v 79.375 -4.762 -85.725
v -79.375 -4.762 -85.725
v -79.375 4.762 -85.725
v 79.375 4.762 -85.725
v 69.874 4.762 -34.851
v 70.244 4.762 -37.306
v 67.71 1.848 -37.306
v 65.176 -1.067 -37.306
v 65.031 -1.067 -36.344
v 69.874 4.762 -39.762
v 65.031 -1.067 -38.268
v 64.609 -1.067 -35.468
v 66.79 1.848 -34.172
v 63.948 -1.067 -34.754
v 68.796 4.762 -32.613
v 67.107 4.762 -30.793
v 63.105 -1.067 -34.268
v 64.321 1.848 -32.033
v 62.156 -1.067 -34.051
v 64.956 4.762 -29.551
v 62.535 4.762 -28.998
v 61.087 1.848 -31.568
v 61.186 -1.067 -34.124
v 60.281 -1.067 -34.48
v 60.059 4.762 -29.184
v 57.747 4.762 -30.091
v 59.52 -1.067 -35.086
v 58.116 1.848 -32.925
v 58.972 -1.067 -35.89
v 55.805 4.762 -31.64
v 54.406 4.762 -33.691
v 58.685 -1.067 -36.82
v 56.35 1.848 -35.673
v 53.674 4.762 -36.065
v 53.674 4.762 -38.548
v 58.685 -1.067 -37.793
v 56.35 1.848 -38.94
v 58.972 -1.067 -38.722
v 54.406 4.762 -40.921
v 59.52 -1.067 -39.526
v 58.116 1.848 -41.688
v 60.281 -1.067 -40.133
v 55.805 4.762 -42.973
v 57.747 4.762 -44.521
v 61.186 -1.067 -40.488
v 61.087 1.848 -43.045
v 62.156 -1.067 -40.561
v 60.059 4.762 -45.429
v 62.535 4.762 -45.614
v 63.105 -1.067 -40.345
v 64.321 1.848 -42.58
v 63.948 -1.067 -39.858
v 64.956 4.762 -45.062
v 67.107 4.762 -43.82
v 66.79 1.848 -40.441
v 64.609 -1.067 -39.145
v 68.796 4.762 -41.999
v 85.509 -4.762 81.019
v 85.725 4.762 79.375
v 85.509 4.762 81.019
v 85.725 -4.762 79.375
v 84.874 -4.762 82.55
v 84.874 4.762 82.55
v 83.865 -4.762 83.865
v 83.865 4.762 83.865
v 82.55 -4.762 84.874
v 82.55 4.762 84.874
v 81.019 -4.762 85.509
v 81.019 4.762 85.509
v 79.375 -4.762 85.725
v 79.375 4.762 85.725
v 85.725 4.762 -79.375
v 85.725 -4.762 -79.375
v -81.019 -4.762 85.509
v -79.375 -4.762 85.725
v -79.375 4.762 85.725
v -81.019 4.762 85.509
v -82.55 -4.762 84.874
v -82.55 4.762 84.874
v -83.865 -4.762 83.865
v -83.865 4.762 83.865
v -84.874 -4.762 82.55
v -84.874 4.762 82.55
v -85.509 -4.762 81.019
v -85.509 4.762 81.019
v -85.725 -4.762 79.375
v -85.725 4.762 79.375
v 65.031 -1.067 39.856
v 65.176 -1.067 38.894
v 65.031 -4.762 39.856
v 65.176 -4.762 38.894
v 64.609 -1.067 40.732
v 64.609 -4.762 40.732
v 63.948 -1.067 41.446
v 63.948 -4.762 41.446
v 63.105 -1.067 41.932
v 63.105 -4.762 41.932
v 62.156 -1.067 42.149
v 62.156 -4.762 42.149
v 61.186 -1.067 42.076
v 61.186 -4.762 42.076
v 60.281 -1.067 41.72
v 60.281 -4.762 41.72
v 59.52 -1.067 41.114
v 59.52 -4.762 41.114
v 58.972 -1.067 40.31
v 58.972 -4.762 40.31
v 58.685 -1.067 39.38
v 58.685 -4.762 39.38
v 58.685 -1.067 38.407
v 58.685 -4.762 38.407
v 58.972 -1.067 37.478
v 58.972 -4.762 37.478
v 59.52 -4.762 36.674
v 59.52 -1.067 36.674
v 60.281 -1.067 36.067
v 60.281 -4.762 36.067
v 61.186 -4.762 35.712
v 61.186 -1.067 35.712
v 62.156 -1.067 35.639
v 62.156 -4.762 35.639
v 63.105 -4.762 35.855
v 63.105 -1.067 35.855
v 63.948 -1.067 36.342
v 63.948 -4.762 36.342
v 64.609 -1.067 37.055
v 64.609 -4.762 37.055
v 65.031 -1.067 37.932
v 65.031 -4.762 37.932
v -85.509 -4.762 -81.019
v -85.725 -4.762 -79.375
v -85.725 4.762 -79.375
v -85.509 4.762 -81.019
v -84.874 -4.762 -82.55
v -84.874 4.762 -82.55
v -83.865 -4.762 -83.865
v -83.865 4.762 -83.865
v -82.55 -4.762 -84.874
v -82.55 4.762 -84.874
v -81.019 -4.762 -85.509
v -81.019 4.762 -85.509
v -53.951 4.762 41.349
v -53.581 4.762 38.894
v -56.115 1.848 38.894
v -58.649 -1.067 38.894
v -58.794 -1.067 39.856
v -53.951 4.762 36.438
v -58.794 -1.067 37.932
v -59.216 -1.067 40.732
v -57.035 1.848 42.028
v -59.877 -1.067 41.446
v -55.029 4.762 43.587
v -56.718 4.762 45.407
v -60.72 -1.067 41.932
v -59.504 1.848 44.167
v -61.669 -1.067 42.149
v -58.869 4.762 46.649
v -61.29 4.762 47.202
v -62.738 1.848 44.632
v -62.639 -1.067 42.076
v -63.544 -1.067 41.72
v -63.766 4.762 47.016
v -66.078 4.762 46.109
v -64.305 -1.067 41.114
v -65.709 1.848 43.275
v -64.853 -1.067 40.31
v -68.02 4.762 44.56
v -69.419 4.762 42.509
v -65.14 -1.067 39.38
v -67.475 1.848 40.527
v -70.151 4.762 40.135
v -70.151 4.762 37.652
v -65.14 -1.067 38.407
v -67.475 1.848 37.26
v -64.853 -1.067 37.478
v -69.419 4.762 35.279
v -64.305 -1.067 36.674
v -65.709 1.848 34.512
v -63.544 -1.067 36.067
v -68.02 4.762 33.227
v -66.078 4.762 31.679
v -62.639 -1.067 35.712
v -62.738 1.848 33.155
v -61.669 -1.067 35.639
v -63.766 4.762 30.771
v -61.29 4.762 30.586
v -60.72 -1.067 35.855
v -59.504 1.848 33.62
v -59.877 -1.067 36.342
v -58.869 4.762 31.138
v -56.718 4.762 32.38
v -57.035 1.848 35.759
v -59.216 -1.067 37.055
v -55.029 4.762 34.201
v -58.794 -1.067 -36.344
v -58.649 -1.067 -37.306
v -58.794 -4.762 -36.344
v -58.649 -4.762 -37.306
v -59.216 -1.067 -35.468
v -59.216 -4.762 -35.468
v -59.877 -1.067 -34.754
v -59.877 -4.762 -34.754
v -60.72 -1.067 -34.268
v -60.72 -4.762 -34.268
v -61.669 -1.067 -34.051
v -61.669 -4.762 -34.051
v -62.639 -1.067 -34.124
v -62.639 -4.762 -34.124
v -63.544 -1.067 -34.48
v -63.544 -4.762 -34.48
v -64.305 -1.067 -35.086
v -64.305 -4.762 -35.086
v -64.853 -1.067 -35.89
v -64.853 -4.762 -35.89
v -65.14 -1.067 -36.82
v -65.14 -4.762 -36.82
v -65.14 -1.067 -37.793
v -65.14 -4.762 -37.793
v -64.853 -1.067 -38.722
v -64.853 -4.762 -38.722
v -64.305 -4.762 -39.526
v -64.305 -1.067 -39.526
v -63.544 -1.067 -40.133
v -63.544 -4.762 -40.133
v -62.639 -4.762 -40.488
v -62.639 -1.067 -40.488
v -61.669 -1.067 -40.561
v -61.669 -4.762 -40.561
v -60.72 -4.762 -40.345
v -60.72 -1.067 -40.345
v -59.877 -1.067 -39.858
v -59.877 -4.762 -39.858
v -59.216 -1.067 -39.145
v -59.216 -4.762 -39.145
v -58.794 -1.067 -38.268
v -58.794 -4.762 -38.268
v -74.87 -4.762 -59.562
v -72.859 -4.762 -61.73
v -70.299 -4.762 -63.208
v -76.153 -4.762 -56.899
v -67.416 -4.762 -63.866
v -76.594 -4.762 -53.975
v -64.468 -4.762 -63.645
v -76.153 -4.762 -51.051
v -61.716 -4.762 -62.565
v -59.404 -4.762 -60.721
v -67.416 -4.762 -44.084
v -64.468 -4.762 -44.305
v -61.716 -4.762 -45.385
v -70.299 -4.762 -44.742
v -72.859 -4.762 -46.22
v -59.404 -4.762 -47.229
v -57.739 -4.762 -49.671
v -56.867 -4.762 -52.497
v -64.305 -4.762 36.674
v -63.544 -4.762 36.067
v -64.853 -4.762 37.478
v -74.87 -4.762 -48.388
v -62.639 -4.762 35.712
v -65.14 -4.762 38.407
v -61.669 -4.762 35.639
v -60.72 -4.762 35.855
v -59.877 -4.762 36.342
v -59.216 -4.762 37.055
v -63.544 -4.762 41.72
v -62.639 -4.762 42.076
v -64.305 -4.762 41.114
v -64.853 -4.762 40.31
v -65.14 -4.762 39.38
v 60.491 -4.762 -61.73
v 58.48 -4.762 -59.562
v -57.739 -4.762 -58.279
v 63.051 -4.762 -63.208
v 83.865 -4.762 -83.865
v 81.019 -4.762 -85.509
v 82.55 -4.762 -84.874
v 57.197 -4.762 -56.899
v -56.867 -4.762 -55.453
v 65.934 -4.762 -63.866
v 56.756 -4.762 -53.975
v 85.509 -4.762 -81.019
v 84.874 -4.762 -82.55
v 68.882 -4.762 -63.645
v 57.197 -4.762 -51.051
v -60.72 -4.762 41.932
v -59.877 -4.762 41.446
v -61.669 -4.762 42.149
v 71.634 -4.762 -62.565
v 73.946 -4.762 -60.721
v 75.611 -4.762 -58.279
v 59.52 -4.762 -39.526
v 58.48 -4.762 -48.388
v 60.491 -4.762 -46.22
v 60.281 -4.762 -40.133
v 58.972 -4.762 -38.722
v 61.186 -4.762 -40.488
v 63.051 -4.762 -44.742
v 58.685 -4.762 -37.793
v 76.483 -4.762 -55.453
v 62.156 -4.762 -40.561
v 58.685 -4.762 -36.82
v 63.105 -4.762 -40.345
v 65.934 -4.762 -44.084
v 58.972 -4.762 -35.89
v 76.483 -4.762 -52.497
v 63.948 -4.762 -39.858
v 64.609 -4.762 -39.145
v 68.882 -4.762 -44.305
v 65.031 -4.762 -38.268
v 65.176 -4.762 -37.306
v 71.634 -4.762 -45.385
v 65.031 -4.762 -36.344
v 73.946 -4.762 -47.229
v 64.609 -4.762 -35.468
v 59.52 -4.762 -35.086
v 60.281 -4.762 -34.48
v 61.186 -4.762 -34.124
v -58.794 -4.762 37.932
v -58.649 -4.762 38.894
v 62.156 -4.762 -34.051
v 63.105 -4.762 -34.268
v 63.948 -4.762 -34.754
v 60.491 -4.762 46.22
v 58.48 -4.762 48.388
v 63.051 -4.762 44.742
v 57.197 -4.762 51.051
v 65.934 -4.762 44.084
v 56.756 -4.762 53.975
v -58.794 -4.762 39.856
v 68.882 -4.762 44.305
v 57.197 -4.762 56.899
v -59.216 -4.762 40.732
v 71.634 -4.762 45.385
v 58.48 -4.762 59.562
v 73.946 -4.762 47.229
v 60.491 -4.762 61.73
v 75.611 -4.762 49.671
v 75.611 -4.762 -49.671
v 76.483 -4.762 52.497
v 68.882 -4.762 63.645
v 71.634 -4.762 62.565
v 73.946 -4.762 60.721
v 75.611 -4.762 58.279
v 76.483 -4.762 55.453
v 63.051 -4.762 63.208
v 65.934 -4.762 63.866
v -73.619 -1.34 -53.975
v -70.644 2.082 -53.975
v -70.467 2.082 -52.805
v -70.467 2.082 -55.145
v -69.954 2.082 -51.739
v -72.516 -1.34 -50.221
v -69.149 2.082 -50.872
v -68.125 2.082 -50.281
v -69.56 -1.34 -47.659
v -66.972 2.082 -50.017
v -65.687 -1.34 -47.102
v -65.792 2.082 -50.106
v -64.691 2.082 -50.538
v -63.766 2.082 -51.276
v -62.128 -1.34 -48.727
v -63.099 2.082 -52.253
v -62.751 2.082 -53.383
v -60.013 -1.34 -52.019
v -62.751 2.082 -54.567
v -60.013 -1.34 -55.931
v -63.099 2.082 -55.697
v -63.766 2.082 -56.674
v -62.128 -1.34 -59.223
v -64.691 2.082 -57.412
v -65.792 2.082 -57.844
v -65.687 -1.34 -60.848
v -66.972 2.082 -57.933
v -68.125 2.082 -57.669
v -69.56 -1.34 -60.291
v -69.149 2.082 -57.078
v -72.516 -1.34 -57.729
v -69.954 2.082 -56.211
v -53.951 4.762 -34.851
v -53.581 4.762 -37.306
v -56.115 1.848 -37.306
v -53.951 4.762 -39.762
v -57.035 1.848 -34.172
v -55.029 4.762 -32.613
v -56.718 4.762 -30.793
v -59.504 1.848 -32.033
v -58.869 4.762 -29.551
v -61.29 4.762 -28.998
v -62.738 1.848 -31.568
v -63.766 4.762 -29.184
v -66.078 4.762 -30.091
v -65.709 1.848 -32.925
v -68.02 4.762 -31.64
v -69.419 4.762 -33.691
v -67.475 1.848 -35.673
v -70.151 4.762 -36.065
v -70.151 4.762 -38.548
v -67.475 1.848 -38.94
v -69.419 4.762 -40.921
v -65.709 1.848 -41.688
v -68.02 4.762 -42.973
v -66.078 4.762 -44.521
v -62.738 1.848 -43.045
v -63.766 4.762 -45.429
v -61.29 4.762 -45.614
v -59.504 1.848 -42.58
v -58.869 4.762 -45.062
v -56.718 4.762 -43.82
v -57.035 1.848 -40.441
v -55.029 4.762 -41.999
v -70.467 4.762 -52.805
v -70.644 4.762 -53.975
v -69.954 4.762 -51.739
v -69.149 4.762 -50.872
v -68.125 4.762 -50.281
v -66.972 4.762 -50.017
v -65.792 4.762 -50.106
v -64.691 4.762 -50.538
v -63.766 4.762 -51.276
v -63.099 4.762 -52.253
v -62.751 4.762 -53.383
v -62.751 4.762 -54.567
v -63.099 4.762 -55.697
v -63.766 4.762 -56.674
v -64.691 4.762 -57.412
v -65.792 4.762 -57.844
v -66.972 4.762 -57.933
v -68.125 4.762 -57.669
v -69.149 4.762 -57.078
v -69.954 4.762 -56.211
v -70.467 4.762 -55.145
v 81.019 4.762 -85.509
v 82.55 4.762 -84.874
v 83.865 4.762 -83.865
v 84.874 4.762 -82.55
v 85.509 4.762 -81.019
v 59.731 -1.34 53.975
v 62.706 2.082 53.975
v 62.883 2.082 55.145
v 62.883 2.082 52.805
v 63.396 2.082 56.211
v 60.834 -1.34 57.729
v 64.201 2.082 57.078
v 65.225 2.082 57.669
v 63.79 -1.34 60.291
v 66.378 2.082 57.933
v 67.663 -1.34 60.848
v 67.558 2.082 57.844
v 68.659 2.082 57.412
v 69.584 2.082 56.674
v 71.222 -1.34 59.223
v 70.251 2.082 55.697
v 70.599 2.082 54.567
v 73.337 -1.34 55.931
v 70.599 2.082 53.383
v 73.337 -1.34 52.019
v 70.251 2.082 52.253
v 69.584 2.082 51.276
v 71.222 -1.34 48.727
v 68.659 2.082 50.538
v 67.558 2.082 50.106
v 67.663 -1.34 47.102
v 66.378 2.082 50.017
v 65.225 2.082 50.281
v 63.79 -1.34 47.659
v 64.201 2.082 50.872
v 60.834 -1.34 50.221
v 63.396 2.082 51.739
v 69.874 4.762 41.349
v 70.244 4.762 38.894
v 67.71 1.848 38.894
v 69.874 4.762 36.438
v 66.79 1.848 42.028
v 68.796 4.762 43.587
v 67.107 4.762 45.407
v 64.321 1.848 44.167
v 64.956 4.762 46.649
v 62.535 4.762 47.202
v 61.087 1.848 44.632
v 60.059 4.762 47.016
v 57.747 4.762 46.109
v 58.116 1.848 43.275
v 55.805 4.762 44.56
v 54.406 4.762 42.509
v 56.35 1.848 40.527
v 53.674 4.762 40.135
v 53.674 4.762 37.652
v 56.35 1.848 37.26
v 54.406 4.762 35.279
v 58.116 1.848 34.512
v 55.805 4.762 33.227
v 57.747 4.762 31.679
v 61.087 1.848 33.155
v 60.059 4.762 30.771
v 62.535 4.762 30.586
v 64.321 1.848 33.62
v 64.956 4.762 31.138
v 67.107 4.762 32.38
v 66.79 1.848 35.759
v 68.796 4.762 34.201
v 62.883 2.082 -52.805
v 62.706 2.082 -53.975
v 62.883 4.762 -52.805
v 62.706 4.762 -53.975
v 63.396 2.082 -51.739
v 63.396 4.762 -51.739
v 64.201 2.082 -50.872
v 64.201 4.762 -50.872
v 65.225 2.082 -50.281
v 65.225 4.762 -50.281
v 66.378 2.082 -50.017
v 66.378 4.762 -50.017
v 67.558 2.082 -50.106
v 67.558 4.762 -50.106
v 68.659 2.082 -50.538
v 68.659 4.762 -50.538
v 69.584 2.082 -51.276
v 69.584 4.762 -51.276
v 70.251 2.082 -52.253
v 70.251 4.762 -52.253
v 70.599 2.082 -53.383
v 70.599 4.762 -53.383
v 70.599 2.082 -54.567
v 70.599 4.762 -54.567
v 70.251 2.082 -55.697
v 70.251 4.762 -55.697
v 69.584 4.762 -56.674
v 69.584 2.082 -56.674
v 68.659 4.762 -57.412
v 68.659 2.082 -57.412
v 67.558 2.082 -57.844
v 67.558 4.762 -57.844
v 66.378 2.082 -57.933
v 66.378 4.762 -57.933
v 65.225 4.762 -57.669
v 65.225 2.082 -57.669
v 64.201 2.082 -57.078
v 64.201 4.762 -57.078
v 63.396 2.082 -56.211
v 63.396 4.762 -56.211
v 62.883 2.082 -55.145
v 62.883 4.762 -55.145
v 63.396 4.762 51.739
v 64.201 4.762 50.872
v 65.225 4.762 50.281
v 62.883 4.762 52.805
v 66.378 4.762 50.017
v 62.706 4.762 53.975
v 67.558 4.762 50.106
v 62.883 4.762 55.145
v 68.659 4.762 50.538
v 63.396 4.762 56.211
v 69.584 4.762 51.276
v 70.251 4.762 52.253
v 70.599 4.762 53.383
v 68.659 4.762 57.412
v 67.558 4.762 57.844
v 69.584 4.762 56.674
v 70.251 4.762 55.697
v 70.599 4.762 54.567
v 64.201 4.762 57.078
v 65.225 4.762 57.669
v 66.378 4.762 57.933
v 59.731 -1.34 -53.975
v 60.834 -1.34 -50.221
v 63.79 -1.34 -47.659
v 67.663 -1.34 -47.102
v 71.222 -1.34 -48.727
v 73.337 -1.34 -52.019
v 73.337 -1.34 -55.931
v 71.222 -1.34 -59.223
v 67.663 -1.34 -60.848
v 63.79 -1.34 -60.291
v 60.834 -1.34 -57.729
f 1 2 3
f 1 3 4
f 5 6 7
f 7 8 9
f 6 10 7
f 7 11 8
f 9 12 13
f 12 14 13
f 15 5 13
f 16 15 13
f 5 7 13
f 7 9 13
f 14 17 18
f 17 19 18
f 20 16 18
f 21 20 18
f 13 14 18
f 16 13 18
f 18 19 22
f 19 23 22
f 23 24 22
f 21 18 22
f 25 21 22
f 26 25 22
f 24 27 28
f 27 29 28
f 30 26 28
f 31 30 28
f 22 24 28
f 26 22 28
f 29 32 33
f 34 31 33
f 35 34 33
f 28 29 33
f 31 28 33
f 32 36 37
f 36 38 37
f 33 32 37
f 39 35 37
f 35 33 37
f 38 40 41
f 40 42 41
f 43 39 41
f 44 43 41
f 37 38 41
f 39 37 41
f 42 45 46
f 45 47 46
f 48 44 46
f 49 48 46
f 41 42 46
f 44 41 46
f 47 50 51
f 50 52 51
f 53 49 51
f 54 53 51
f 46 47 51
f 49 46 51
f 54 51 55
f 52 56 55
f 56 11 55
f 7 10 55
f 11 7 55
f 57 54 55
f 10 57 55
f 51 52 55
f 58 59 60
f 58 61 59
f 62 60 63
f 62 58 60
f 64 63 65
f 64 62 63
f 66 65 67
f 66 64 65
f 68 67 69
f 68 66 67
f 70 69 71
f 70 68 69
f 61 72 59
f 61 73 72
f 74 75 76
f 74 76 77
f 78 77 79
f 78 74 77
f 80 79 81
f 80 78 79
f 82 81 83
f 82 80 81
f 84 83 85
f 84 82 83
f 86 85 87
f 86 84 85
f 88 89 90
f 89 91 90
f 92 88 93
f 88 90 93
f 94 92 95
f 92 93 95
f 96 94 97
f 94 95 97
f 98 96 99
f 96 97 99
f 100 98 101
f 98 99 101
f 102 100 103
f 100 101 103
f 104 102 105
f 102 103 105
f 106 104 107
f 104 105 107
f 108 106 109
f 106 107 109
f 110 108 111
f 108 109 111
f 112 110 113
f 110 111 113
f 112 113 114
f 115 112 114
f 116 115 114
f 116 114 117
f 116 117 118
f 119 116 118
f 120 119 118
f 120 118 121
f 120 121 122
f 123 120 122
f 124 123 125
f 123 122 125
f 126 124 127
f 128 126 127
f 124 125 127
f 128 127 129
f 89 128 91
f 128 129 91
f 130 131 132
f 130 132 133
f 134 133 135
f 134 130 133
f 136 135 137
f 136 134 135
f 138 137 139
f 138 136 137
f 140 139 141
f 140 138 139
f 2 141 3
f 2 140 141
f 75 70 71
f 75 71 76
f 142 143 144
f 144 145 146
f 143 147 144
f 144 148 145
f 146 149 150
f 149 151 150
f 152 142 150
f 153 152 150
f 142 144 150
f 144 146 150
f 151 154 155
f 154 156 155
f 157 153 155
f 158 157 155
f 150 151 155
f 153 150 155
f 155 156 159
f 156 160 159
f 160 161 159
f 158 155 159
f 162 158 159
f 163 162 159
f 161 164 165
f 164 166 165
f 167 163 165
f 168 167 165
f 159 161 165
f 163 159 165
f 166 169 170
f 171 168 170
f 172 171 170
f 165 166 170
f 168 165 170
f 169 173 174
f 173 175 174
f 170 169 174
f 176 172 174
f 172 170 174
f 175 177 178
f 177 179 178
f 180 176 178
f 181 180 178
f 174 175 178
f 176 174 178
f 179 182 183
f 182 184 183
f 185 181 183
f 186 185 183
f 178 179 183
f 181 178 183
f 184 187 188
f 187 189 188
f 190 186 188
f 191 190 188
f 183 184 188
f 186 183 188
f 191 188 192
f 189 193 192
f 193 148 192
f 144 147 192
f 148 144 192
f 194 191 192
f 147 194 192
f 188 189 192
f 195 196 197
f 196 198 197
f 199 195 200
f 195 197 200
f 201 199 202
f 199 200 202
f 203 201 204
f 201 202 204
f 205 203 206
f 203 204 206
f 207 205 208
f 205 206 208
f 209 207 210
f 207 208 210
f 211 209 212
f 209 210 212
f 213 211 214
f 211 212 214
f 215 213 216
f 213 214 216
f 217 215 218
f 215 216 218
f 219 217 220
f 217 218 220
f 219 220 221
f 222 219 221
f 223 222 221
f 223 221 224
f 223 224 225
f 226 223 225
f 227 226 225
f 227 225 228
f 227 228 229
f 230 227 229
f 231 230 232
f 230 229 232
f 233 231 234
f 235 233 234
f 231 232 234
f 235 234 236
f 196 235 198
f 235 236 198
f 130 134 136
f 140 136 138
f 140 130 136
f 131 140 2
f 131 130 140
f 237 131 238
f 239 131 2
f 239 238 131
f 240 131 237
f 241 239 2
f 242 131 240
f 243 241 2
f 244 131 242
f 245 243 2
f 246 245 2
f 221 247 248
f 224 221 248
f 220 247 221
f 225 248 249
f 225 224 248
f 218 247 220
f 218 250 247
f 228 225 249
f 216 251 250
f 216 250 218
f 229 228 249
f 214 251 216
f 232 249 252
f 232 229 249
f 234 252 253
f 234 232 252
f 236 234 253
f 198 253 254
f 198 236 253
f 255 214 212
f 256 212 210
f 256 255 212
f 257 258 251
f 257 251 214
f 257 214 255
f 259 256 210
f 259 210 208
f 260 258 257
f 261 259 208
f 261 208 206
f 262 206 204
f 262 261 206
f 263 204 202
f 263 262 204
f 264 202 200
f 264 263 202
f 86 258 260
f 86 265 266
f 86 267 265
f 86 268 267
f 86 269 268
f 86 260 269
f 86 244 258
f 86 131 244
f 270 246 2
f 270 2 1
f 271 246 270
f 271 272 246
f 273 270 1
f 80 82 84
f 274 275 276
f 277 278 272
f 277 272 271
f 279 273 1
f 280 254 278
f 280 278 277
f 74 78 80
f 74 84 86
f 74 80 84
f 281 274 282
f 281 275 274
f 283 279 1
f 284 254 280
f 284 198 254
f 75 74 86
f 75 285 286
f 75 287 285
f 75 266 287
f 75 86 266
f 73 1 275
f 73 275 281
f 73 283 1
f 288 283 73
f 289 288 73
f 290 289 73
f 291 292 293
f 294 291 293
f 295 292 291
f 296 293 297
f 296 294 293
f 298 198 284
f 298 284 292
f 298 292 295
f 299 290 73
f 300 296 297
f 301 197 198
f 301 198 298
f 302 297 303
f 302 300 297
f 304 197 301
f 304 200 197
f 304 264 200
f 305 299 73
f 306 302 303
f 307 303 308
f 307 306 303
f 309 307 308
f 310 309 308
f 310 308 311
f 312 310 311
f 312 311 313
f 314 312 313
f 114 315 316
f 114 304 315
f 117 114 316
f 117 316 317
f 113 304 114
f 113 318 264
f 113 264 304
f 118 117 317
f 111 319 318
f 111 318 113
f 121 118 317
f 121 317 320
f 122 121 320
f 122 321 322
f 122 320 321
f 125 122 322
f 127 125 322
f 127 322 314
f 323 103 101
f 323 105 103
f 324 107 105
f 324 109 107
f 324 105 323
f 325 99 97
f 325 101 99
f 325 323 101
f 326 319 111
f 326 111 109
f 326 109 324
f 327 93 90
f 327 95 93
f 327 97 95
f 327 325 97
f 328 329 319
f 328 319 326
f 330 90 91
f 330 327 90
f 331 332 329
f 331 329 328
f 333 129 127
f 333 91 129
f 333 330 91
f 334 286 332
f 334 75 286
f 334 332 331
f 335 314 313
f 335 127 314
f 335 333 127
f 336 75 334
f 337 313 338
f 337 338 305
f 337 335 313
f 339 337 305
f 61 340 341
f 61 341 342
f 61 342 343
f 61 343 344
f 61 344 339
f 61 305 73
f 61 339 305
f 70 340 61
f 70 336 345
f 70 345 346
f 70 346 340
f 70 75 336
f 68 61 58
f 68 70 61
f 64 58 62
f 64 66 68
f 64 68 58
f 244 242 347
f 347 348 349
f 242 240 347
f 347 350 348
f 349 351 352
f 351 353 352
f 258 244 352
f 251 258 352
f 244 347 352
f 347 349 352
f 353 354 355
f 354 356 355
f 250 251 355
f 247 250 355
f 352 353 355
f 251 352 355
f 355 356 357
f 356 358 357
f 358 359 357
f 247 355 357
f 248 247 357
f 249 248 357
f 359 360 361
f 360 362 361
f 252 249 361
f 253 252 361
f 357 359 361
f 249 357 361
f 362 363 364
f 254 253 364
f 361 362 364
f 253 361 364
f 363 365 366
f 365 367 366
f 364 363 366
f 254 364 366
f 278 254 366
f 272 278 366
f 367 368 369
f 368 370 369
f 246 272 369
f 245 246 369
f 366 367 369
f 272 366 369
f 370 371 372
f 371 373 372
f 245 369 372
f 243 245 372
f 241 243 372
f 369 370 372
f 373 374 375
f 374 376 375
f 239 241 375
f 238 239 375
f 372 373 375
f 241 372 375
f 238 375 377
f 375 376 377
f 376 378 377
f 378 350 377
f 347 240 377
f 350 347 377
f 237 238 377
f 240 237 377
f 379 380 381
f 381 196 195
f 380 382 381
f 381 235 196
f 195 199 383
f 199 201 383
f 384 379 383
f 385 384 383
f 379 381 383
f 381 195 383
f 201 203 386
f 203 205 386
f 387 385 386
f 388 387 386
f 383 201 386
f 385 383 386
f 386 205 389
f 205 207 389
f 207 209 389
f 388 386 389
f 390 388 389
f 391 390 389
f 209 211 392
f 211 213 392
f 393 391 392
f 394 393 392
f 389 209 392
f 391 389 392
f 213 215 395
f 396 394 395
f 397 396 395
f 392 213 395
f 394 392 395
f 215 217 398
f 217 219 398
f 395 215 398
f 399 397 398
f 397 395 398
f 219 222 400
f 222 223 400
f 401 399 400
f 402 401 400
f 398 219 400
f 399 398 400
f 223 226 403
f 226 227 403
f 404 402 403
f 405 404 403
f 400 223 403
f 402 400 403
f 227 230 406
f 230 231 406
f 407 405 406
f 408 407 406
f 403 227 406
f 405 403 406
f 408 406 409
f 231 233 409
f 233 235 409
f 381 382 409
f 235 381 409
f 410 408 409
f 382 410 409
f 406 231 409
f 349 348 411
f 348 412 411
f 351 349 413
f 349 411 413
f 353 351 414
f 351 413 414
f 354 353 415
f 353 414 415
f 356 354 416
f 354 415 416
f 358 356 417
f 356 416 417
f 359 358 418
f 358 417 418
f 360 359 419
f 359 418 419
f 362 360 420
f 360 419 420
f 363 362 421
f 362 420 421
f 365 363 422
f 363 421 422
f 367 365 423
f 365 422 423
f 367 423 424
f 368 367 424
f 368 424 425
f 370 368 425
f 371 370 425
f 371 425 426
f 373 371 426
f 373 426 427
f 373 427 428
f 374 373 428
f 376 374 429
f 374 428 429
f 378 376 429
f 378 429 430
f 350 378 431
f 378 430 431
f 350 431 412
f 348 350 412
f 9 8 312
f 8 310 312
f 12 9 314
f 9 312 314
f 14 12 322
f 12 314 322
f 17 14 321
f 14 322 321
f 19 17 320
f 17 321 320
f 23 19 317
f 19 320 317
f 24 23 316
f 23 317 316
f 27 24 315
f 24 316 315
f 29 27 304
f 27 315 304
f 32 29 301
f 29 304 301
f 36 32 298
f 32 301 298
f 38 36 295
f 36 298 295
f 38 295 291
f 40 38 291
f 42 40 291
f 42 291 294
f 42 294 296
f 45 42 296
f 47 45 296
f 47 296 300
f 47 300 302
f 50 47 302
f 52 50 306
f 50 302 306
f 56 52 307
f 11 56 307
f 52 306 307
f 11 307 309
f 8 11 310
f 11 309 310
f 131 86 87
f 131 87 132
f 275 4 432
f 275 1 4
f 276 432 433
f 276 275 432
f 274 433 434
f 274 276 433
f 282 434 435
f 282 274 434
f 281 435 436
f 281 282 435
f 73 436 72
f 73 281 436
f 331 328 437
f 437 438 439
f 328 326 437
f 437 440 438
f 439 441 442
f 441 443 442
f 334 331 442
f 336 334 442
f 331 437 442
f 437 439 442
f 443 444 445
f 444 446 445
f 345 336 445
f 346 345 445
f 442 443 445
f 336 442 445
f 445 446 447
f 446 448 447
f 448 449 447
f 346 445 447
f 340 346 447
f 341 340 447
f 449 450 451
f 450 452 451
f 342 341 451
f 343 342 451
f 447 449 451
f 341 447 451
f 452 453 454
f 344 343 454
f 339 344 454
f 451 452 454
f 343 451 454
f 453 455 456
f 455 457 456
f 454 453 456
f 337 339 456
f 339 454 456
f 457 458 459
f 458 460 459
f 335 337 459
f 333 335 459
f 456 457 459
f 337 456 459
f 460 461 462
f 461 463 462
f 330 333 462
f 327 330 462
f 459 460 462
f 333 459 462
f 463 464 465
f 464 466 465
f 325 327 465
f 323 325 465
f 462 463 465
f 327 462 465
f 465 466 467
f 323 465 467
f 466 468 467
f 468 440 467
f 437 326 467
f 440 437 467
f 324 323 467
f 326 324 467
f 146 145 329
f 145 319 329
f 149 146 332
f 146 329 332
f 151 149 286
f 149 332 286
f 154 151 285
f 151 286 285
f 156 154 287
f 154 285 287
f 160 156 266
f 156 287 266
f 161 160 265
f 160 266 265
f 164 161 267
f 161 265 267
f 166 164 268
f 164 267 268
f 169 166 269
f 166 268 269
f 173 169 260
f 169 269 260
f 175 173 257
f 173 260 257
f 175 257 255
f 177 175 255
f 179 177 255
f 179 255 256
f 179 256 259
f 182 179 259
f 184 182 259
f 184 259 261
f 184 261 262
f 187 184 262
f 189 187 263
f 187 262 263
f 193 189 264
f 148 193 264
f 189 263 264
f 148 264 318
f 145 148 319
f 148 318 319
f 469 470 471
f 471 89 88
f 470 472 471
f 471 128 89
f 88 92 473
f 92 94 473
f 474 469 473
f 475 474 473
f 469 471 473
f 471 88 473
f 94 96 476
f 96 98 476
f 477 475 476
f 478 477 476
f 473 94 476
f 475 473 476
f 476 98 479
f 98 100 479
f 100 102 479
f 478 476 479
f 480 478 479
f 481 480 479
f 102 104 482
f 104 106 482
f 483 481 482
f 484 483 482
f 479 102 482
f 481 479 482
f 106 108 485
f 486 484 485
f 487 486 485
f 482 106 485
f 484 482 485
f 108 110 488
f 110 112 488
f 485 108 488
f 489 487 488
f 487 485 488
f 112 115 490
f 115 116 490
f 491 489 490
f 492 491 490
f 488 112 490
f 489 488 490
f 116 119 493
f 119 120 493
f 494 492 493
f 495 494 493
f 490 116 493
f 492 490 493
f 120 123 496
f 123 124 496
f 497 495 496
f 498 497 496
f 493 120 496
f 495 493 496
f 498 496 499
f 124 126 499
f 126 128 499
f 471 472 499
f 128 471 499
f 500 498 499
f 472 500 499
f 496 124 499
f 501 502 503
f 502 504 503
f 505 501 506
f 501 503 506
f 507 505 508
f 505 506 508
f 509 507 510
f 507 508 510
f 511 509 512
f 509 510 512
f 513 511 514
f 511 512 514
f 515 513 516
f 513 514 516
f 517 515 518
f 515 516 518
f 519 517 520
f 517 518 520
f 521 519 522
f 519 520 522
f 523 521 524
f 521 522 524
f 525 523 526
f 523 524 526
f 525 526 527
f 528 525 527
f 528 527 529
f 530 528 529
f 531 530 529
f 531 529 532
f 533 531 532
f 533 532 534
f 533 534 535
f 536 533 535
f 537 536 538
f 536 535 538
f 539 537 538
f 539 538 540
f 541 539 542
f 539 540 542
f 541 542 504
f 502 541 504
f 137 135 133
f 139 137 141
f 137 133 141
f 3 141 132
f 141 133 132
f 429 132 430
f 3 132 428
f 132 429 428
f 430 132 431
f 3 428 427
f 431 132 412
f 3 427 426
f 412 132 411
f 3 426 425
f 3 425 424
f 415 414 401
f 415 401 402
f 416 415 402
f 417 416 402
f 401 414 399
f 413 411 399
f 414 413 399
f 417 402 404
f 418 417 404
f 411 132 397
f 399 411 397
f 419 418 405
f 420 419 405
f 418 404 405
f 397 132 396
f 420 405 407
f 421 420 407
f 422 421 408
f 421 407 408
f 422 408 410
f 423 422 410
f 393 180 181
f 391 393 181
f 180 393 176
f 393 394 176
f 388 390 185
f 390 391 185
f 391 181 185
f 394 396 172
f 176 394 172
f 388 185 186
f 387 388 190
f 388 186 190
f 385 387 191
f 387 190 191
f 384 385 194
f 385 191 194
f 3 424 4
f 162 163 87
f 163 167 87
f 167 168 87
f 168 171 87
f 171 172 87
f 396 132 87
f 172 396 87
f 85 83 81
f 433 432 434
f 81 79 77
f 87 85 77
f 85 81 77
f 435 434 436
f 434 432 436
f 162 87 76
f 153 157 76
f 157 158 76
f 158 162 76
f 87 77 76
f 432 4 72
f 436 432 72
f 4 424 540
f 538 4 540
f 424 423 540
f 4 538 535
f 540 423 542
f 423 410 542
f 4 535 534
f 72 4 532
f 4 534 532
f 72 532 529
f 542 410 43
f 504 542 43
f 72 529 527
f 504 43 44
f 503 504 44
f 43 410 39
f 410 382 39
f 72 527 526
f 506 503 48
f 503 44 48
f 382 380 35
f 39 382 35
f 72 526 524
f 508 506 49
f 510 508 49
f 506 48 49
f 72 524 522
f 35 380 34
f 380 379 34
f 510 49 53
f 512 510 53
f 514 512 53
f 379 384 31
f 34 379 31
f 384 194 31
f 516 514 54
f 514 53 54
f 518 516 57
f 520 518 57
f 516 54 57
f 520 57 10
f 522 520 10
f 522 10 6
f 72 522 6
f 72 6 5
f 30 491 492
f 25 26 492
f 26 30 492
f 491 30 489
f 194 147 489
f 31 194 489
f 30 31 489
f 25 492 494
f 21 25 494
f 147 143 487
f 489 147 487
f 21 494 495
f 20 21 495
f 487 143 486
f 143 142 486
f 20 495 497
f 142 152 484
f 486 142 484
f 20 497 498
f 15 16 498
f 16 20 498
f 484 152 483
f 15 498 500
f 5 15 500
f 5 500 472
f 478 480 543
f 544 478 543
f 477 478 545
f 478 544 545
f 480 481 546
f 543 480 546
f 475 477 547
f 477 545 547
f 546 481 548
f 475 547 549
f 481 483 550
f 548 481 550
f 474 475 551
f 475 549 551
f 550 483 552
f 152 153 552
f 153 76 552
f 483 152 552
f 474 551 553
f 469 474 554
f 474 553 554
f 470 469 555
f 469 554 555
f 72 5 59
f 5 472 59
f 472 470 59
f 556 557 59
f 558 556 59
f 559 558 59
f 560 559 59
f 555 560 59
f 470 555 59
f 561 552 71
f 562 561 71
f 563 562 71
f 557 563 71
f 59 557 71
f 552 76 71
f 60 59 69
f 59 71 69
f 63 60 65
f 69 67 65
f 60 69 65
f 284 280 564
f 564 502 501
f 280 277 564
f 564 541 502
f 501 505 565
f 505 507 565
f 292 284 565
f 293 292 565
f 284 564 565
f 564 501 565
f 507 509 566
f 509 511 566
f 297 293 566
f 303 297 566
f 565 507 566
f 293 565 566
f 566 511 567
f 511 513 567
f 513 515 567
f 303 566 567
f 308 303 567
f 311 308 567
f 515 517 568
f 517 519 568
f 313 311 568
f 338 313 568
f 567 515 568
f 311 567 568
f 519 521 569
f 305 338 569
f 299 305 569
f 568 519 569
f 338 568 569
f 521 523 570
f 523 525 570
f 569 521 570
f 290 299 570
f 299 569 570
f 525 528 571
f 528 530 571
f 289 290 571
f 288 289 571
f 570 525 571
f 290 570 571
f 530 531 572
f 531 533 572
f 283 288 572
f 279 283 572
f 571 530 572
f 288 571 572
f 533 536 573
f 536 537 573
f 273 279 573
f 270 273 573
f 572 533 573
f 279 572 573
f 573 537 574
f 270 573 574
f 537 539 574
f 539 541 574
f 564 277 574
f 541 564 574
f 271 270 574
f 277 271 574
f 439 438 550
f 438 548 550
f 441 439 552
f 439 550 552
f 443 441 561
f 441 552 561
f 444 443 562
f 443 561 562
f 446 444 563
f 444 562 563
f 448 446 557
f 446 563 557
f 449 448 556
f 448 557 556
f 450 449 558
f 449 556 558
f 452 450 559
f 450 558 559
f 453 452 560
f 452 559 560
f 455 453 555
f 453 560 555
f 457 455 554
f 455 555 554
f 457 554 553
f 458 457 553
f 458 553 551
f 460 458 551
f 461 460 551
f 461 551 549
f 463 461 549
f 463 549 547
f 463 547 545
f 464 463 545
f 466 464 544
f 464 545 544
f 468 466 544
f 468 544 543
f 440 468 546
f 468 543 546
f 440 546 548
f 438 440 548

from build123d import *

# Parameters (mm, degrees)
F1_DEPTH       = 4.7625
F3_D           = 7.9375
F3_CSINK_D     = 19.8374
F3_CSINK_ANGLE = 82
F5_D           = 6.5278
F5_CSINK_D     = 16.6624
F5_CSINK_ANGLE = 82


with BuildPart() as f1:
    # F0 (on Front) → F1 (new body, symmetric)
    with BuildSketch(Plane.XZ):
        with BuildLine():
            ThreePointArc((85.725, 79.375), (83.8651280605, 83.8651280605), (79.375, 85.725))
            Line((79.375, 85.725), (-79.375, 85.725))
            ThreePointArc((-79.375, 85.725), (-83.8651280605, 83.8651280605), (-85.725, 79.375))
            Line((-85.725, 79.375), (-85.725, -79.375))
            ThreePointArc((-85.725, -79.375), (-83.8651280605, -83.8651280605), (-79.375, -85.725))
            Line((-79.375, -85.725), (79.375, -85.725))
            ThreePointArc((79.375, -85.725), (83.8651280605, -83.8651280605), (85.725, -79.375))
            Line((85.725, -79.375), (85.725, 79.375))
        make_face()
    extrude(amount=F1_DEPTH, both=True)

    # F3 (through all)
    with Locations(Plane.XZ.offset(4.7625)):
        with Locations((66.675, 53.975), (-66.675, -53.975), (66.675, -53.975)):
            CounterSinkHole(F3_D / 2, F3_CSINK_D / 2, counter_sink_angle=F3_CSINK_ANGLE)

    # F5 (through all)
    with Locations(Plane(origin=(0, 4.7625, 0), x_dir=(-1, 0, 0), z_dir=(0, 1, 0))):
        with Locations((-61.9125, 38.89375), (61.9125, 38.89375), (61.9125, -37.30625), (-61.9125, -37.30625)):
            CounterSinkHole(F5_D / 2, F5_CSINK_D / 2, counter_sink_angle=F5_CSINK_ANGLE)


solid = f1.part
